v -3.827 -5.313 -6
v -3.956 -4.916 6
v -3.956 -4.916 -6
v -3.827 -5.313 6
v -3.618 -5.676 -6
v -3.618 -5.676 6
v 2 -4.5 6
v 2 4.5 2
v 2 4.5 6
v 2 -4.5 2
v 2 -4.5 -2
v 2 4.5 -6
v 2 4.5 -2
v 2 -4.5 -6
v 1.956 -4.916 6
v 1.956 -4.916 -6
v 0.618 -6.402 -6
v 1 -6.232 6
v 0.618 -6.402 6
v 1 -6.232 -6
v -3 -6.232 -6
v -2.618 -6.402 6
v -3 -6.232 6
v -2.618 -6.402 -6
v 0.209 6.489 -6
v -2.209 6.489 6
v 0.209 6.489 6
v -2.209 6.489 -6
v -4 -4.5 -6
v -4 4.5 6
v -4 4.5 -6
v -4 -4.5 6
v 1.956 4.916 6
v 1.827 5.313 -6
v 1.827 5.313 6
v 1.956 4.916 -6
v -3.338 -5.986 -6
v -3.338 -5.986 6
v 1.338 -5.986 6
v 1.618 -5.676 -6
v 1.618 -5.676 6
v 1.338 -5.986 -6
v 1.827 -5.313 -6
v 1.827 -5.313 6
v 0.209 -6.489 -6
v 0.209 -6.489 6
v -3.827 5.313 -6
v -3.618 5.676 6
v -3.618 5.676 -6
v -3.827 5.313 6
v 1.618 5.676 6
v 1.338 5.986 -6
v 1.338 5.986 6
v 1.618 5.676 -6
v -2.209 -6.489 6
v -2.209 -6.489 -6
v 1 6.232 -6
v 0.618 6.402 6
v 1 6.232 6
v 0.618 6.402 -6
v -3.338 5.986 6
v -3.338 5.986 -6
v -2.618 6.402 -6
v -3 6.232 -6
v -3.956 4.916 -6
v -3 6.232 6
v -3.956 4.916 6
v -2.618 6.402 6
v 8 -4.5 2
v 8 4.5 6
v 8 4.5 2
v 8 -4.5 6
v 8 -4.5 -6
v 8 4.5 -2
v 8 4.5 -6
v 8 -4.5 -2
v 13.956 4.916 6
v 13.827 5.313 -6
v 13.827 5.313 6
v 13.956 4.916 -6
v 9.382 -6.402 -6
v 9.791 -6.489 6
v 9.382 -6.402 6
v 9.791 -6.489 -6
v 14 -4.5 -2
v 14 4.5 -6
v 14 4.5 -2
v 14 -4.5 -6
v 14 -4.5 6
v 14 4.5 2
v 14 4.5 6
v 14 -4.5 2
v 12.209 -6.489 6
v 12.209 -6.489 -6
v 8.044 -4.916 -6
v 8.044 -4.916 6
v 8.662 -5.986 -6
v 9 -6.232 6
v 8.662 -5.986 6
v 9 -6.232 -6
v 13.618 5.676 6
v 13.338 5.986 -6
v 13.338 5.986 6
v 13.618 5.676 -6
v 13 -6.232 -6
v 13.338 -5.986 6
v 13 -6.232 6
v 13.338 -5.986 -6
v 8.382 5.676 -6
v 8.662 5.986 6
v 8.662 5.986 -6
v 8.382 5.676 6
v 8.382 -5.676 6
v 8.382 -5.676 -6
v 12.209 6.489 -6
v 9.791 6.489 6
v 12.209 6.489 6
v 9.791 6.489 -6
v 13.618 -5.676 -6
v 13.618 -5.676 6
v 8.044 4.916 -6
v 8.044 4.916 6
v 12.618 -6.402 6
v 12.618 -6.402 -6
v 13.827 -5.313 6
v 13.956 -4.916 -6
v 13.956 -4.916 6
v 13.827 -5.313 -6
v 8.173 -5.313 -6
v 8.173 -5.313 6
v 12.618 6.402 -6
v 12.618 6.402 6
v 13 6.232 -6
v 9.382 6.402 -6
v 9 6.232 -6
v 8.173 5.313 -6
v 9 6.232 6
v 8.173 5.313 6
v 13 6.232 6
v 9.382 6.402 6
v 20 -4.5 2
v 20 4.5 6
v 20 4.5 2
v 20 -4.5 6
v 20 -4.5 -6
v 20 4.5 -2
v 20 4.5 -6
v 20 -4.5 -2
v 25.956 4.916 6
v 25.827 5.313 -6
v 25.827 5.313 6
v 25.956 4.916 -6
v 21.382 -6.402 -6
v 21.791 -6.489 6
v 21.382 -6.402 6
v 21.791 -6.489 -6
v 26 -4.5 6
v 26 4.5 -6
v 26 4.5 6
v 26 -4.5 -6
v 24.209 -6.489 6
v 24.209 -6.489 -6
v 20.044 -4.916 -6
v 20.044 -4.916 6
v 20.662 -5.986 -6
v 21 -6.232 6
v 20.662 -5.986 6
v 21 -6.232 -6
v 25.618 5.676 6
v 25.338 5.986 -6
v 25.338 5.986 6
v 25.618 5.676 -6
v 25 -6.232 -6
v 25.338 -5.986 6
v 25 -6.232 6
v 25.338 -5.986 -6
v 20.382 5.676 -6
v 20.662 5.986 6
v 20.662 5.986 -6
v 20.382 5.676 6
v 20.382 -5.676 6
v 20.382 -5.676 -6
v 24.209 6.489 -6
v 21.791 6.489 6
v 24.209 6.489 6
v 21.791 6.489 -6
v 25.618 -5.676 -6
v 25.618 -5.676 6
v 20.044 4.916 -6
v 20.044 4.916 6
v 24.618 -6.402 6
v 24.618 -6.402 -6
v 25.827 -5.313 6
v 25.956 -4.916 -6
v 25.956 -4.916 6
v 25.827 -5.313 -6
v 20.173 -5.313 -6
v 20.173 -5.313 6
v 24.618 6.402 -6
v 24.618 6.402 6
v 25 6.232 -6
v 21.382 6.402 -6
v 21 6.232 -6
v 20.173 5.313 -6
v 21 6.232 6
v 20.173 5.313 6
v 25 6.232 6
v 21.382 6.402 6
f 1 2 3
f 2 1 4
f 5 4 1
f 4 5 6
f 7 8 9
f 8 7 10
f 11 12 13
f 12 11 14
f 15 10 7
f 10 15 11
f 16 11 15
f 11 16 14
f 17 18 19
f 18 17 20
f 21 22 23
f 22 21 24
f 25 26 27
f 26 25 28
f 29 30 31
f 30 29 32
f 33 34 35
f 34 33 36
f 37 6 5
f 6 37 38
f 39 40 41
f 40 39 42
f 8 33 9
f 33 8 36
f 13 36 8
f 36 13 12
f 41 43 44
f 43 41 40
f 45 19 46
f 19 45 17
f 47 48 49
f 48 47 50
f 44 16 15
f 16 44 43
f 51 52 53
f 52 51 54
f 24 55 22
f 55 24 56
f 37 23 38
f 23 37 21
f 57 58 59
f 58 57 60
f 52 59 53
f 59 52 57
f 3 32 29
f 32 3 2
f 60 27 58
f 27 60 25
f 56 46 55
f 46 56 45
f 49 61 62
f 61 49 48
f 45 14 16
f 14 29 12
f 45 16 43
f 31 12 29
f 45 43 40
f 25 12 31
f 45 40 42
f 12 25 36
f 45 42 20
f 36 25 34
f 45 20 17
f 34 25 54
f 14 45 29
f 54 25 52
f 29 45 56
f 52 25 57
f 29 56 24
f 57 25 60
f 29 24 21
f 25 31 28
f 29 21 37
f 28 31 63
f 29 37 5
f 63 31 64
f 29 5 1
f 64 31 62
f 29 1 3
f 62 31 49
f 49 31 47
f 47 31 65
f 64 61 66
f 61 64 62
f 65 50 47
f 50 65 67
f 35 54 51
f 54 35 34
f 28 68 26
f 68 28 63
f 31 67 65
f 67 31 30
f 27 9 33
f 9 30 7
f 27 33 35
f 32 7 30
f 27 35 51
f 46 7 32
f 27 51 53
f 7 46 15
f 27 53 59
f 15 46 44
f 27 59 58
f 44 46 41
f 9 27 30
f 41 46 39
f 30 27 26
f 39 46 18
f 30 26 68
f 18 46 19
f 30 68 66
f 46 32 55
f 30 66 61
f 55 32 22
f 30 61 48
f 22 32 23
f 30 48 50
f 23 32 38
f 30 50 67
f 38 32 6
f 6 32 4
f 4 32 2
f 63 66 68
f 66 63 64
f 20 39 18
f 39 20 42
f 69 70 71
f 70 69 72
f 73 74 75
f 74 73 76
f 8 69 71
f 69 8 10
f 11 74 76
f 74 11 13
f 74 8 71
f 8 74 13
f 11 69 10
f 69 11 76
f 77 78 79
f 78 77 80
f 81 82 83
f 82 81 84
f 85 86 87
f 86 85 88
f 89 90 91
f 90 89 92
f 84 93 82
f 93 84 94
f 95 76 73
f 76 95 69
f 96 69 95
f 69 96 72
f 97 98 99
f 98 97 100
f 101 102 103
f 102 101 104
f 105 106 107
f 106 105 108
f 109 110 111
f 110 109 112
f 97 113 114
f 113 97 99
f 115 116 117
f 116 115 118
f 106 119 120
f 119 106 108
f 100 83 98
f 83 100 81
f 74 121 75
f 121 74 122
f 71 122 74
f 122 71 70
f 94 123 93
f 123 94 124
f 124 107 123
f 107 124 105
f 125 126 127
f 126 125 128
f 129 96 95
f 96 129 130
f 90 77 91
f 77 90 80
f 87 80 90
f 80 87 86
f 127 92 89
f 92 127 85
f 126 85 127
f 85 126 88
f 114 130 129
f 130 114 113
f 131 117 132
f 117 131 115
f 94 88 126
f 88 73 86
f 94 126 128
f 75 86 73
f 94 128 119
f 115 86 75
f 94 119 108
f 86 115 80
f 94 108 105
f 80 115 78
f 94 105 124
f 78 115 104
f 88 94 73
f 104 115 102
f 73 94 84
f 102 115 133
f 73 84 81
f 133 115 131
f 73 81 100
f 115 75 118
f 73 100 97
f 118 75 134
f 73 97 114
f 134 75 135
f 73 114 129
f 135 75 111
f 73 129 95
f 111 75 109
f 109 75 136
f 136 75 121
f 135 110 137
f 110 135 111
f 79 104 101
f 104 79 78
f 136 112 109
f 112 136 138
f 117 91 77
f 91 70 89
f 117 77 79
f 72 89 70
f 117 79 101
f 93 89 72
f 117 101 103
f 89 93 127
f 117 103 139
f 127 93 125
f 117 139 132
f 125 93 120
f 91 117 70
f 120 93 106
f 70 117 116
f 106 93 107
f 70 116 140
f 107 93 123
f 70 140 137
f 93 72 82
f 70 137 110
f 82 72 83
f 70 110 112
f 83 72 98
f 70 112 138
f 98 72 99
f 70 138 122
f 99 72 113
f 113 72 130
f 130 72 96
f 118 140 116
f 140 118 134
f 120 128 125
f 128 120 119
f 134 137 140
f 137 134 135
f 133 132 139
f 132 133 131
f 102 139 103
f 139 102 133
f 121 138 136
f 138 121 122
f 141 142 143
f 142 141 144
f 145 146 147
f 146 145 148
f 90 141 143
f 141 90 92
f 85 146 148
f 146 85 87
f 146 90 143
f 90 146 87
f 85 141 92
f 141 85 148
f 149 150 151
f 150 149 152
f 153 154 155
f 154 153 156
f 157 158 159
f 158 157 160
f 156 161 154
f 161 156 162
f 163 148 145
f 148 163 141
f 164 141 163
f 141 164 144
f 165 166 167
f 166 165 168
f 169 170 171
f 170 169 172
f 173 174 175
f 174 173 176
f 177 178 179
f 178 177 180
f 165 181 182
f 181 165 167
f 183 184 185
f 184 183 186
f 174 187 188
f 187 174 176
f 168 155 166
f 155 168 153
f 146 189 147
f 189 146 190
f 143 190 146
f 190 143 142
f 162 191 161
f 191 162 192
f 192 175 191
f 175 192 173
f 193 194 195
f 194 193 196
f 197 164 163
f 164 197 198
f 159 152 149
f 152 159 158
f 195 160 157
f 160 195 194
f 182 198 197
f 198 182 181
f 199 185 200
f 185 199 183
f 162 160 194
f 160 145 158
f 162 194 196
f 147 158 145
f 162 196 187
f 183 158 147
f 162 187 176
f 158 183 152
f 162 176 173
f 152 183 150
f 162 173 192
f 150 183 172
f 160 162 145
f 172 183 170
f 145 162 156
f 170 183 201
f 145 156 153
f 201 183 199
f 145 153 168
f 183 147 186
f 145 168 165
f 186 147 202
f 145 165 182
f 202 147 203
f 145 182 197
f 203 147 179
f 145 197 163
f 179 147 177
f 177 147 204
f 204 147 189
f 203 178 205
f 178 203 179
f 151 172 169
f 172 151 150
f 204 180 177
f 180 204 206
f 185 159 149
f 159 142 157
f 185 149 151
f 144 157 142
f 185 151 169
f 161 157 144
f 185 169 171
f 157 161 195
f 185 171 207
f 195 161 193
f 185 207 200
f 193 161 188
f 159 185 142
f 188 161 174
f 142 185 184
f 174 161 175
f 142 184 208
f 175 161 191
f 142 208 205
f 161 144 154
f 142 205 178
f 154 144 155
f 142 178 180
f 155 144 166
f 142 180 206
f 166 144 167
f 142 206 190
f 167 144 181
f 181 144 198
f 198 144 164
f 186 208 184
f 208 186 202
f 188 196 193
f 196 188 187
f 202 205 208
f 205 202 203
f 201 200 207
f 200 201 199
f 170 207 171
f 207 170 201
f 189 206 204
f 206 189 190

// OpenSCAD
$fn=30;
height=12;
radius=2;
union(){
    hull(){
        translate([0,-4.5,0])cylinder(r=radius,h=height, center=true);
        translate([-2,4.5,0])cylinder(r=radius,h=height, center=true);
        translate([0,4.5,0])cylinder(r=radius,h=height, center=true);
        translate([-2,-4.5,0])cylinder(r=radius,h=height, center=true);
  }
  translate([5,0,0])cube([radius/0.3333333333,radius+7,radius+2],center=true);
   translate([12,0,0]) hull(){
        translate([0,-4.5,0])cylinder(r=radius,h=height, center=true);
        translate([-2,4.5,0])cylinder(r=radius,h=height, center=true);
        translate([0,4.5,0])cylinder(r=radius,h=height, center=true);
        translate([-2,-4.5,0])cylinder(r=radius,h=height, center=true);
  }
   translate([17,0,0])cube([radius/0.3333333333,radius+7,radius+2],center=true);
   translate([24,0,0]) hull(){
        translate([0,-4.5,0])cylinder(r=radius,h=height, center=true);
        translate([-2,4.5,0])cylinder(r=radius,h=height, center=true);
        translate([0,4.5,0])cylinder(r=radius,h=height, center=true);
        translate([-2,-4.5,0])cylinder(r=radius,h=height, center=true);
  }
}
